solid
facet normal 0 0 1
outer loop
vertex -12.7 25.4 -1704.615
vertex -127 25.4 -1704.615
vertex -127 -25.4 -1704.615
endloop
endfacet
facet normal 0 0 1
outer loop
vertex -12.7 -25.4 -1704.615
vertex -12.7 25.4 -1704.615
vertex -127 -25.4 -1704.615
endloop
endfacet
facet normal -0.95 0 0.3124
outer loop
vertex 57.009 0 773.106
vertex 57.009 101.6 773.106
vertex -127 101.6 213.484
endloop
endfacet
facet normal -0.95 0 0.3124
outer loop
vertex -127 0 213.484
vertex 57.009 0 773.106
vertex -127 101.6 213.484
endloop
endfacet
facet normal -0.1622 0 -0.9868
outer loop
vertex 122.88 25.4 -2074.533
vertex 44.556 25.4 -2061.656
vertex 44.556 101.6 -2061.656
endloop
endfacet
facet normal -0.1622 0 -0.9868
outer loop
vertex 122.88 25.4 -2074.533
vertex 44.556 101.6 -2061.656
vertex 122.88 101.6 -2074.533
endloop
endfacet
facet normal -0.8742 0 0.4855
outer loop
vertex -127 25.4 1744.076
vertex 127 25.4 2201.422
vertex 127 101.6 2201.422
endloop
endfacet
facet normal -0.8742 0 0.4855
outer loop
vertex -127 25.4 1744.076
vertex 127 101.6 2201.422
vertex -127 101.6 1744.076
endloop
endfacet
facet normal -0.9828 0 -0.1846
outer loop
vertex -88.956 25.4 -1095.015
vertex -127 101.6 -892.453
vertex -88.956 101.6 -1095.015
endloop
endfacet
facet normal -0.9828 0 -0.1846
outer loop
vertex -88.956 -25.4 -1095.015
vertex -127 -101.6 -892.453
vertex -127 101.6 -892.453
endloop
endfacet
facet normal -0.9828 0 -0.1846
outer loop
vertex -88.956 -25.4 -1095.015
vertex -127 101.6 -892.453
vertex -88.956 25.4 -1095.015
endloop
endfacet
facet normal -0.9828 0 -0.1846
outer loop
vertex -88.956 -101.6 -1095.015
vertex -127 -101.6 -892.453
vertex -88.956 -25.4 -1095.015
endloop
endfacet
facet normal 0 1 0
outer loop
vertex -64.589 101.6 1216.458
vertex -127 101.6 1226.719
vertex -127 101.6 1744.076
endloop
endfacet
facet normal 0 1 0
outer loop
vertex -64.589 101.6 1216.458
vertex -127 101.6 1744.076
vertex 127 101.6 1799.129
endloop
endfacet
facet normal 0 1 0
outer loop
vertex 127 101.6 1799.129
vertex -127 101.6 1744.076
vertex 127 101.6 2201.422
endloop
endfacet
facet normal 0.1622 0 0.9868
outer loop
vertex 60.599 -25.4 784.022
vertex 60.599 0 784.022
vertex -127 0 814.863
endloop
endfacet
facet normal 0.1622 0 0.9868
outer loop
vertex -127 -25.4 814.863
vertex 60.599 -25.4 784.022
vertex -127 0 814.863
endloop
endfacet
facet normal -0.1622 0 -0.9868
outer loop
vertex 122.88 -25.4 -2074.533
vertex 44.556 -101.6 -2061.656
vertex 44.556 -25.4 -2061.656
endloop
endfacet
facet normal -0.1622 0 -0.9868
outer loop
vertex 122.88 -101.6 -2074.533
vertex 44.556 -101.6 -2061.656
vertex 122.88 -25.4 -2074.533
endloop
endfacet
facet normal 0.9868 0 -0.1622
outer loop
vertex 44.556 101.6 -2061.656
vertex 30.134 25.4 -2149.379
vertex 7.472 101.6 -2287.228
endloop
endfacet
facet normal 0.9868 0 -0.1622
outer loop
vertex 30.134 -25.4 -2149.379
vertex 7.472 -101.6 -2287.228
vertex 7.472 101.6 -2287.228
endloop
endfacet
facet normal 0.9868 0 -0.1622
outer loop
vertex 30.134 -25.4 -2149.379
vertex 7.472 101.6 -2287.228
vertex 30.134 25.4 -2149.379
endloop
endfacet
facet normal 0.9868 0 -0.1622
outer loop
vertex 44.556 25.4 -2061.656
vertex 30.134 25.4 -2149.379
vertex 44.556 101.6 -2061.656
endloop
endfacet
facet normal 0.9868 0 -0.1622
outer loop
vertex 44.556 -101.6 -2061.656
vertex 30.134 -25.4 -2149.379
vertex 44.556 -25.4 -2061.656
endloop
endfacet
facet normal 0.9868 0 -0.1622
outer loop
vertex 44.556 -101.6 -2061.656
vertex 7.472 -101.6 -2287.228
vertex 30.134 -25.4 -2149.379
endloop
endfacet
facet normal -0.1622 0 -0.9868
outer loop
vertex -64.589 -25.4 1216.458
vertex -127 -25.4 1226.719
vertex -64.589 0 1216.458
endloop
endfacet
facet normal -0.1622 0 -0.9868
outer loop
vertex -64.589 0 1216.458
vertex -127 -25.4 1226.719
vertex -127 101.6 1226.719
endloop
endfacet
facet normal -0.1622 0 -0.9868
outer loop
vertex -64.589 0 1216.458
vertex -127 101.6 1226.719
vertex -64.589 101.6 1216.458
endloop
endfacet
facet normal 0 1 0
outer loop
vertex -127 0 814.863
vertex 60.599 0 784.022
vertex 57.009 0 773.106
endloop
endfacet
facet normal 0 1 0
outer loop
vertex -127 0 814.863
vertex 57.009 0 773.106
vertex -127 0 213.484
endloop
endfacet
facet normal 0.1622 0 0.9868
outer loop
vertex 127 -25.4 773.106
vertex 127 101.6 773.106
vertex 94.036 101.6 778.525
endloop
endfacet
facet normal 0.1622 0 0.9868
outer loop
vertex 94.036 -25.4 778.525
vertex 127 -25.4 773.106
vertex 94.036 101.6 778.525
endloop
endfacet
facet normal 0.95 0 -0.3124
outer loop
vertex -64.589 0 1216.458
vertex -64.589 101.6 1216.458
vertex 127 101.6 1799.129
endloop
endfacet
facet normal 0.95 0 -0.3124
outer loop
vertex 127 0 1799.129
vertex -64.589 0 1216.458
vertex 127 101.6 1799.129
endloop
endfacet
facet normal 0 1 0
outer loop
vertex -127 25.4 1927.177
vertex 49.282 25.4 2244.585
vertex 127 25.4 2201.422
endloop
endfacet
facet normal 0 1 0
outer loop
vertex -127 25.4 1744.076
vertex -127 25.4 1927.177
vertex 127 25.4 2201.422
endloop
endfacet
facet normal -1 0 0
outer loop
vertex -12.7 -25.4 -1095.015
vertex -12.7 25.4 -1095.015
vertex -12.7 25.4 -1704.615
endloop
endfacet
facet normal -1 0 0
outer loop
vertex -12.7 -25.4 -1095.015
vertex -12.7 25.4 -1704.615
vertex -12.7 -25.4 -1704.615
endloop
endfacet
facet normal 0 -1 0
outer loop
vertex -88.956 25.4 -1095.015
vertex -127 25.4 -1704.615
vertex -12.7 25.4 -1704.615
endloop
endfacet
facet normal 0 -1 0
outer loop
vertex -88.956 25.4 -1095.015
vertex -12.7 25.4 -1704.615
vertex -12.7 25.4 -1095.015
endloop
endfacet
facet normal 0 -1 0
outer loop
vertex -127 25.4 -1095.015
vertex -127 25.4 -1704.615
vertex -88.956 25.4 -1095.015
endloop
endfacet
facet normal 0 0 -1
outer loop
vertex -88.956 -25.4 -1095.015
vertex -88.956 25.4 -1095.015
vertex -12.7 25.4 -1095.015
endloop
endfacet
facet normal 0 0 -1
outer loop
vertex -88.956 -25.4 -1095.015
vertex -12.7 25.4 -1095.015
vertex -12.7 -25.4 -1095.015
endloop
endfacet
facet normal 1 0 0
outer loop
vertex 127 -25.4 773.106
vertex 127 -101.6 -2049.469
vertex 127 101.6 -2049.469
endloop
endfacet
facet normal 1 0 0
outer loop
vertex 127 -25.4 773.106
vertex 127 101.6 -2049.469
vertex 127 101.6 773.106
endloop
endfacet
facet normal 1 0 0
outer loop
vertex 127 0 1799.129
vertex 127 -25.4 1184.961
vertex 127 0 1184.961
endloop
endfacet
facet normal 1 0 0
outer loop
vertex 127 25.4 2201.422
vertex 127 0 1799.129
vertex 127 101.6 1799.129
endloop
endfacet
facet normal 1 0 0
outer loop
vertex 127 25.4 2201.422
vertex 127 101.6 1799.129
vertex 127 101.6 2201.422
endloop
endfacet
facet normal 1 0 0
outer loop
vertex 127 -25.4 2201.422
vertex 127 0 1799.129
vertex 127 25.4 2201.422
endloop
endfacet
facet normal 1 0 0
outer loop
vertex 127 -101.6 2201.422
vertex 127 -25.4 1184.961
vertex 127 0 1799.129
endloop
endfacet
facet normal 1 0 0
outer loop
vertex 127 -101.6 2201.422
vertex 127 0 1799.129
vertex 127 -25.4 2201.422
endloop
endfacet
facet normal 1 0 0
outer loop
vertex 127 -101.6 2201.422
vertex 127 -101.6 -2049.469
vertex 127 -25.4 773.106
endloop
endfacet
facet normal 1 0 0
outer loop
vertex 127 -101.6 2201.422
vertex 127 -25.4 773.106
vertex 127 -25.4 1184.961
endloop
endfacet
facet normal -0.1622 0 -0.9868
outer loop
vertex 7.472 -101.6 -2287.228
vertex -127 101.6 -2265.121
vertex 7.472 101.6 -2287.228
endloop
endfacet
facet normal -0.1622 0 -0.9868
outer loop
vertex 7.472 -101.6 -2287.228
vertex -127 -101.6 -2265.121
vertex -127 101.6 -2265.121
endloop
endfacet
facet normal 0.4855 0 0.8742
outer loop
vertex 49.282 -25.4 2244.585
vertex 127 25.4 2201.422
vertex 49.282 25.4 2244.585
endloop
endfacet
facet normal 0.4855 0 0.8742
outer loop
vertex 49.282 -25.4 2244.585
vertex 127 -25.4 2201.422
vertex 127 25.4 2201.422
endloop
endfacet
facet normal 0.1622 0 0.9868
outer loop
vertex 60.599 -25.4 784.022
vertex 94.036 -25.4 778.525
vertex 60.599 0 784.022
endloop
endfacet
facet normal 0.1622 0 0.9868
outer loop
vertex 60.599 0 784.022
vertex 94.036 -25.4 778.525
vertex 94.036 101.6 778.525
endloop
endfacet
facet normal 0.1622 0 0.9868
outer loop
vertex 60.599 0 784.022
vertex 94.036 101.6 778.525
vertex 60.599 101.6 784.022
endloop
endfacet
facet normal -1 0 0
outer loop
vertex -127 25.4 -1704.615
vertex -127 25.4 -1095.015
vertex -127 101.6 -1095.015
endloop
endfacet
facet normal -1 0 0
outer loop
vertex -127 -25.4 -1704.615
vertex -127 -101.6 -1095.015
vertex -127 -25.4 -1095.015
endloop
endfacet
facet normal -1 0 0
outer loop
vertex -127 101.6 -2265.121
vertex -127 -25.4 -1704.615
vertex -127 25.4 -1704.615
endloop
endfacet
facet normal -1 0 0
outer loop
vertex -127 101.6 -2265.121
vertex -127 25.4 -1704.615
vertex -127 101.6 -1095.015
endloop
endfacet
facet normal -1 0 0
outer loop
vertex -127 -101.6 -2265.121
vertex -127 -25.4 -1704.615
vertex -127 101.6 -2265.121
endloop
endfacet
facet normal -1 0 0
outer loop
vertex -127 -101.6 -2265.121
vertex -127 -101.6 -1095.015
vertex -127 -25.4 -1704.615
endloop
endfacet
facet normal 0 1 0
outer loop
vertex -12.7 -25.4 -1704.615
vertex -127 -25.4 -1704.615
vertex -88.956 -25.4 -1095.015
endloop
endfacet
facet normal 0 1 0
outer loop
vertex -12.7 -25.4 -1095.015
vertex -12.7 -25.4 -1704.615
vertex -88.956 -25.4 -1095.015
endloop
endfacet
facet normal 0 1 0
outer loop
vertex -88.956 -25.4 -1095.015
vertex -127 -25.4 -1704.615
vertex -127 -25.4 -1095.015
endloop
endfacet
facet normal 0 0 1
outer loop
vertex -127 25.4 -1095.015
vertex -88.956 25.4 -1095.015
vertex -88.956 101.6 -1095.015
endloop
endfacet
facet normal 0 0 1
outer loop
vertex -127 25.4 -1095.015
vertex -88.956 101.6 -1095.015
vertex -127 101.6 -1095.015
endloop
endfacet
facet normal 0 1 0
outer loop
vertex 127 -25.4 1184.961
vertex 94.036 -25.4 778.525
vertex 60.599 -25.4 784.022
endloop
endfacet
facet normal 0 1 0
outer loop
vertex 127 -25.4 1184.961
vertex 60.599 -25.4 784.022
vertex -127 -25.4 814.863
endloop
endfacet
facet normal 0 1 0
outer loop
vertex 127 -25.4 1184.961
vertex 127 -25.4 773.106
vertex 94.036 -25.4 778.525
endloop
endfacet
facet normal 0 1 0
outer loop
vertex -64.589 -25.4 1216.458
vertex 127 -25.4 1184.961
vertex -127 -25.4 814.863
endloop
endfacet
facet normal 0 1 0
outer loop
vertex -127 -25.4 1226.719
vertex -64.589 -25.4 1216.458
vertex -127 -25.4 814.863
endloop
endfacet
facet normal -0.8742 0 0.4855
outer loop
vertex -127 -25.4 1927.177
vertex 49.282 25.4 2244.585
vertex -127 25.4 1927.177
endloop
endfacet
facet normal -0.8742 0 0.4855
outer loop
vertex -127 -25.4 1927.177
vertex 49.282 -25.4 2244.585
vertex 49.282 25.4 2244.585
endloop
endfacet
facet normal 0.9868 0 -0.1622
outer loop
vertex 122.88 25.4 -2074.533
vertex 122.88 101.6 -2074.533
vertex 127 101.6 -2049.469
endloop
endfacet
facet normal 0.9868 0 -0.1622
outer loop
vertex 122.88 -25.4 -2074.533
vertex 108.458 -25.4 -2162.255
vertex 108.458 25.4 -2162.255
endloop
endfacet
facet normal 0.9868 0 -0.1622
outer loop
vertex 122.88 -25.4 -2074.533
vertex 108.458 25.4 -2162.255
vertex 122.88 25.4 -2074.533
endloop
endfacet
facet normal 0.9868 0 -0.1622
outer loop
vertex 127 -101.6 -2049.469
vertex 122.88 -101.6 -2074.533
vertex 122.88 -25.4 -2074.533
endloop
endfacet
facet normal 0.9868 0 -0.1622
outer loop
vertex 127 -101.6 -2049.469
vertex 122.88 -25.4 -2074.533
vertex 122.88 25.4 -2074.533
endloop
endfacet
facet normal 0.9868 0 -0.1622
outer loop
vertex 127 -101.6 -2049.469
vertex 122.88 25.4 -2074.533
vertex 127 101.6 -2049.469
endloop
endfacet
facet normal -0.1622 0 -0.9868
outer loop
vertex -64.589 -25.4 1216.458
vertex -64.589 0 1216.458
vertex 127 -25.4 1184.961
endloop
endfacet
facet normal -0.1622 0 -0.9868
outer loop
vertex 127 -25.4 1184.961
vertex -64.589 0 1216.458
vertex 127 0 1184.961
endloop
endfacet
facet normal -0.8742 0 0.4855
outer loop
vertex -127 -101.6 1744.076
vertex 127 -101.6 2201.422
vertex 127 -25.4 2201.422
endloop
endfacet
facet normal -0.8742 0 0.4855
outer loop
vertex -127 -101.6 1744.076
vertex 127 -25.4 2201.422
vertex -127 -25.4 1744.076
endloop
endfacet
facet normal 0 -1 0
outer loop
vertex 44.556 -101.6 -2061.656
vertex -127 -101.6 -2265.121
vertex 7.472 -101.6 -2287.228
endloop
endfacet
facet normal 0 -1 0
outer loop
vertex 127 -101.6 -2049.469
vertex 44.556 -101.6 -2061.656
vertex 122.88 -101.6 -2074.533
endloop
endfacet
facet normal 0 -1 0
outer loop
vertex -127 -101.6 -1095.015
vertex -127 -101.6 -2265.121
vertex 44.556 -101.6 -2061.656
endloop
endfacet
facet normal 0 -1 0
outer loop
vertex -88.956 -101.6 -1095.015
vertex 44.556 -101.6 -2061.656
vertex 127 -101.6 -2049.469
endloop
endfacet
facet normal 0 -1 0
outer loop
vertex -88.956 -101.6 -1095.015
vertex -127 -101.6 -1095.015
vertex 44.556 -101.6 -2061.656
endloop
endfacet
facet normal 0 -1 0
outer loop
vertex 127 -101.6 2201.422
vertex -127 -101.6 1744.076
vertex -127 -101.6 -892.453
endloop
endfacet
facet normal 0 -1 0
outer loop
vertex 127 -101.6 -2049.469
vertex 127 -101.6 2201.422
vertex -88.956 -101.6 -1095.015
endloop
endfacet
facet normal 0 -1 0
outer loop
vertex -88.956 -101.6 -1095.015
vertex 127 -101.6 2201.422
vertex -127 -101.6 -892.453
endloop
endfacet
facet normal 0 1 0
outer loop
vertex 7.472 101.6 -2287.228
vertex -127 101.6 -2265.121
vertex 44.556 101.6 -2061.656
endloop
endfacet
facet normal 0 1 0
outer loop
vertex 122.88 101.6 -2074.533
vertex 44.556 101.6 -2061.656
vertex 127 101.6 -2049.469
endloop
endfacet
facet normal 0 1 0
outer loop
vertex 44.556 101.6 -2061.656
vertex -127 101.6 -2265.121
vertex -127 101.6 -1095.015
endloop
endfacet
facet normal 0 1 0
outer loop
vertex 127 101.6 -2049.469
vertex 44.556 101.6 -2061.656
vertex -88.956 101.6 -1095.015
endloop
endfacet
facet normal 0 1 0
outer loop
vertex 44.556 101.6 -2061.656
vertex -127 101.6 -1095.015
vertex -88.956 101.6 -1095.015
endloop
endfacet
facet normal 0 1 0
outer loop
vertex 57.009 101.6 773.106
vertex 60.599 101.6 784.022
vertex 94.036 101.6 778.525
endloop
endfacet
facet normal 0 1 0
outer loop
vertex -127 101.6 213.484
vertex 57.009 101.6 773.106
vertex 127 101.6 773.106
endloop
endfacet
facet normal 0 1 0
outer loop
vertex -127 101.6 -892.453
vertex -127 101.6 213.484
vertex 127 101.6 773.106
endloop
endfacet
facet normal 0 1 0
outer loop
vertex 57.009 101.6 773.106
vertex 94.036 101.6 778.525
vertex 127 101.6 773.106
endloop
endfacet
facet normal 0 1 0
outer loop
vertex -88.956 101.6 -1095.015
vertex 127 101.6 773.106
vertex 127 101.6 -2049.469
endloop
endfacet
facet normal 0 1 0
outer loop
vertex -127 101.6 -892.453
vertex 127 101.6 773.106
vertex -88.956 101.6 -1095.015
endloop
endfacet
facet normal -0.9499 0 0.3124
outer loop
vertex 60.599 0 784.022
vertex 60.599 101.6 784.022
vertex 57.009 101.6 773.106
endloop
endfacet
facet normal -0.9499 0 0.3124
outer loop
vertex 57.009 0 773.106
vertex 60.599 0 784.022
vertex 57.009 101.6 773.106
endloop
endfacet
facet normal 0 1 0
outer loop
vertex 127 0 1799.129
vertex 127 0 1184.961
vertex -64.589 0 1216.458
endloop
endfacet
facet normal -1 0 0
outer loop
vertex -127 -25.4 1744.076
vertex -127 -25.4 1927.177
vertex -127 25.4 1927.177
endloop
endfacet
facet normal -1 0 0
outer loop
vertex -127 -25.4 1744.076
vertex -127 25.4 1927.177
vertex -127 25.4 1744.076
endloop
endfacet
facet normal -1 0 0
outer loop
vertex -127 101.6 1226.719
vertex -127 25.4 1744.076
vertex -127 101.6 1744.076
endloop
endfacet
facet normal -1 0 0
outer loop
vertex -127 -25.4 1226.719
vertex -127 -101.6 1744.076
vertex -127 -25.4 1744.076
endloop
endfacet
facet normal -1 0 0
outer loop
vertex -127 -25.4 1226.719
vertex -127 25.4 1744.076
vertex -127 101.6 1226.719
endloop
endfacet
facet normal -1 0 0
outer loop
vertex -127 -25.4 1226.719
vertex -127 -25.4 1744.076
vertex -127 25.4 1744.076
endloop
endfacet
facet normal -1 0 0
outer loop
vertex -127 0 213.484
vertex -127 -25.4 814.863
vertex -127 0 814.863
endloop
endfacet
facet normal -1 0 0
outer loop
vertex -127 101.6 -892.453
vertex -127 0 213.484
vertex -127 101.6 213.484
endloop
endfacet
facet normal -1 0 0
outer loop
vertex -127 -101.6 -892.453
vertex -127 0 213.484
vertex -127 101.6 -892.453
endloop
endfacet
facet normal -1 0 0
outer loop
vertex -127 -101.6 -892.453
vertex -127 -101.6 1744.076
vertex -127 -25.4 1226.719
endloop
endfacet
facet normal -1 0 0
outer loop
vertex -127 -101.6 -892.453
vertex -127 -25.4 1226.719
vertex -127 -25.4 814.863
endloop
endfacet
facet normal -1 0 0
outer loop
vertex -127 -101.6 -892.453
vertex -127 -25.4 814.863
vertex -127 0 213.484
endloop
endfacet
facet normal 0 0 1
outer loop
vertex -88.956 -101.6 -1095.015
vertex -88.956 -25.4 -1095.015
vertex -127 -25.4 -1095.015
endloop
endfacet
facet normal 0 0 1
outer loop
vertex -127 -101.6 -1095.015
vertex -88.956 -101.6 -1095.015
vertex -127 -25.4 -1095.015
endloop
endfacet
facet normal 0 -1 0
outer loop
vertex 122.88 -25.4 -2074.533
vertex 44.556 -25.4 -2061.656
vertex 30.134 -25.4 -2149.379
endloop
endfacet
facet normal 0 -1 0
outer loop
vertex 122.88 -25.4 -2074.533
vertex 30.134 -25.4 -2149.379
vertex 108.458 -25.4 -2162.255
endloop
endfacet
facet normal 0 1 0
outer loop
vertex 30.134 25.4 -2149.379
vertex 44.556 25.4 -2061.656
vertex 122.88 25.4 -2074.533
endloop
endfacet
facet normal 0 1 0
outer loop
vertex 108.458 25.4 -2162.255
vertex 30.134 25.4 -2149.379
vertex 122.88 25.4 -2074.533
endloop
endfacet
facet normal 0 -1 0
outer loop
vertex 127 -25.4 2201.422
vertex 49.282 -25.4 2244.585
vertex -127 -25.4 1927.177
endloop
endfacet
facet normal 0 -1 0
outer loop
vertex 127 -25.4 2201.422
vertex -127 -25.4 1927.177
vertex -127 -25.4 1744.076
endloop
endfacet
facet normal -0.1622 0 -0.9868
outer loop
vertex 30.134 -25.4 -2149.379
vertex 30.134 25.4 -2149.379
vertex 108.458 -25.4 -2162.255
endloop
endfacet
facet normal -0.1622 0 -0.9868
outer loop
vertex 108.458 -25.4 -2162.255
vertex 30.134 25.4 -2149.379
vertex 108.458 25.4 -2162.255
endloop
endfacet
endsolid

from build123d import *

# Parameters (mm, degrees)
F1_DEPTH = 101.6
F2_DEPTH = 25.4
F4_DEPTH = 127
F5_DEPTH = 101.6
F6_W     = 50.8
F6_H     = 609.6
F7_DEPTH = 114.3


# Not quite as in the source:
# - a feature names something its author has since deleted; it is built from what else it names


with BuildPart() as f1:
    # F0 (on Front) → F1 (new body, symmetric)
    with BuildSketch(Plane.XZ):
        Polygon((48.6763836202, -2036.5928072073), (-127, -2007.7116097401), (-127, -2265.1212), (7.4718955151, -2287.2283796227), (30.1343639729, -2149.3788147942), (44.5559348097, -2061.6563644488), align=None)
        Polygon((122.8795511895, -2074.5327669817), (127, -2049.4692097401), (48.6763836202, -2036.5928072073), (44.5559348097, -2061.6563644488), align=None)
        Polygon((127, -2049.4692097401), (127, -1560.1717829992), (48.6763836202, -2036.5928072073), align=None)
        Polygon((127, 2201.4217376709), (-127, 1744.0764904022), (-127, -892.4533128738), (-88.955976069, -1095.0152873993), (-127, -1095.0152873993), (-127, -2007.7116097401), (48.6763836202, -2036.5928072073), (127, -1560.1717829992), (127, 1433.3240232688), align=None)
    extrude(amount=F1_DEPTH, both=True)

    # F0 (on Front) → F2 (join, symmetric)
    with BuildSketch(Plane.XZ):
        Polygon((108.4579803527, -2162.2552173271), (122.8795511895, -2074.5327669817), (44.5559348097, -2061.6563644488), (30.1343639729, -2149.3788147942), align=None)
        Polygon((49.2815975347, 2244.584915476), (-127, 1927.1772351083), (-127, 1744.0764904022), (127, 2201.4217376709), align=None)
    extrude(amount=F2_DEPTH, both=True)

    # F3 (on face) → F4 (cut)
    with BuildSketch(Plane(origin=(0, 101.6, 0), x_dir=(-1, 0, 0), z_dir=(0, 1, 0))):
        Polygon((-127, 979.0334624678), (-94.0364095159, 778.5250045355), (-60.5988418361, 784.022140662), (-124.8374418386, 979.3889870295), align=None)
        Polygon((-127, 979.0334624678), (-127, 773.1057902599), (-94.0364095159, 778.5250045355), align=None)
        Polygon((-124.8374418386, 979.3889870295), (-60.5988418361, 784.022140662), (127, 814.8633902599), (127, 1020.7910624678), align=None)
        Polygon((64.588744063, 1216.4583241996), (127, 1026.6494750977), (127, 1226.7187346757), align=None)
        Polygon((-127, 985.9659075737), (-127, 979.0334624678), (-124.8374418386, 979.3889870295), align=None)
        Polygon((-127, 985.9659075737), (-124.8374418386, 979.3889870295), (127, 1020.7910624678), (127, 1026.6494750977), (64.588744063, 1216.4583241996), (-127, 1184.9611346757), align=None)
    extrude(amount=-F4_DEPTH, mode=Mode.SUBTRACT)

    # F3 (on face) → F5 (cut)
    with BuildSketch(Plane(origin=(0, 101.6, 0), x_dir=(-1, 0, 0), z_dir=(0, 1, 0))):
        Polygon((-60.5988418361, 784.022140662), (-57.0094351378, 773.1057902599), (127, 773.1057902599), (127, 814.8633902599), align=None)
        Polygon((127, 773.1057902599), (-57.0094351378, 773.1057902599), (127, 213.483646512), align=None)
        Polygon((-127, 1799.129486084), (-127, 1184.9611346757), (64.588744063, 1216.4583241996), align=None)
    extrude(amount=-F5_DEPTH, mode=Mode.SUBTRACT)

    # F6 (on face) → F7 (cut)
    with BuildSketch(Plane(origin=(-127, 0, 0), x_dir=(0, -1, 0), z_dir=(-1, 0, 0))):
        with Locations((0, -1399.8152873993)):
            Rectangle(F6_W, F6_H)
    extrude(amount=-F7_DEPTH, mode=Mode.SUBTRACT)


solid = f1.part
